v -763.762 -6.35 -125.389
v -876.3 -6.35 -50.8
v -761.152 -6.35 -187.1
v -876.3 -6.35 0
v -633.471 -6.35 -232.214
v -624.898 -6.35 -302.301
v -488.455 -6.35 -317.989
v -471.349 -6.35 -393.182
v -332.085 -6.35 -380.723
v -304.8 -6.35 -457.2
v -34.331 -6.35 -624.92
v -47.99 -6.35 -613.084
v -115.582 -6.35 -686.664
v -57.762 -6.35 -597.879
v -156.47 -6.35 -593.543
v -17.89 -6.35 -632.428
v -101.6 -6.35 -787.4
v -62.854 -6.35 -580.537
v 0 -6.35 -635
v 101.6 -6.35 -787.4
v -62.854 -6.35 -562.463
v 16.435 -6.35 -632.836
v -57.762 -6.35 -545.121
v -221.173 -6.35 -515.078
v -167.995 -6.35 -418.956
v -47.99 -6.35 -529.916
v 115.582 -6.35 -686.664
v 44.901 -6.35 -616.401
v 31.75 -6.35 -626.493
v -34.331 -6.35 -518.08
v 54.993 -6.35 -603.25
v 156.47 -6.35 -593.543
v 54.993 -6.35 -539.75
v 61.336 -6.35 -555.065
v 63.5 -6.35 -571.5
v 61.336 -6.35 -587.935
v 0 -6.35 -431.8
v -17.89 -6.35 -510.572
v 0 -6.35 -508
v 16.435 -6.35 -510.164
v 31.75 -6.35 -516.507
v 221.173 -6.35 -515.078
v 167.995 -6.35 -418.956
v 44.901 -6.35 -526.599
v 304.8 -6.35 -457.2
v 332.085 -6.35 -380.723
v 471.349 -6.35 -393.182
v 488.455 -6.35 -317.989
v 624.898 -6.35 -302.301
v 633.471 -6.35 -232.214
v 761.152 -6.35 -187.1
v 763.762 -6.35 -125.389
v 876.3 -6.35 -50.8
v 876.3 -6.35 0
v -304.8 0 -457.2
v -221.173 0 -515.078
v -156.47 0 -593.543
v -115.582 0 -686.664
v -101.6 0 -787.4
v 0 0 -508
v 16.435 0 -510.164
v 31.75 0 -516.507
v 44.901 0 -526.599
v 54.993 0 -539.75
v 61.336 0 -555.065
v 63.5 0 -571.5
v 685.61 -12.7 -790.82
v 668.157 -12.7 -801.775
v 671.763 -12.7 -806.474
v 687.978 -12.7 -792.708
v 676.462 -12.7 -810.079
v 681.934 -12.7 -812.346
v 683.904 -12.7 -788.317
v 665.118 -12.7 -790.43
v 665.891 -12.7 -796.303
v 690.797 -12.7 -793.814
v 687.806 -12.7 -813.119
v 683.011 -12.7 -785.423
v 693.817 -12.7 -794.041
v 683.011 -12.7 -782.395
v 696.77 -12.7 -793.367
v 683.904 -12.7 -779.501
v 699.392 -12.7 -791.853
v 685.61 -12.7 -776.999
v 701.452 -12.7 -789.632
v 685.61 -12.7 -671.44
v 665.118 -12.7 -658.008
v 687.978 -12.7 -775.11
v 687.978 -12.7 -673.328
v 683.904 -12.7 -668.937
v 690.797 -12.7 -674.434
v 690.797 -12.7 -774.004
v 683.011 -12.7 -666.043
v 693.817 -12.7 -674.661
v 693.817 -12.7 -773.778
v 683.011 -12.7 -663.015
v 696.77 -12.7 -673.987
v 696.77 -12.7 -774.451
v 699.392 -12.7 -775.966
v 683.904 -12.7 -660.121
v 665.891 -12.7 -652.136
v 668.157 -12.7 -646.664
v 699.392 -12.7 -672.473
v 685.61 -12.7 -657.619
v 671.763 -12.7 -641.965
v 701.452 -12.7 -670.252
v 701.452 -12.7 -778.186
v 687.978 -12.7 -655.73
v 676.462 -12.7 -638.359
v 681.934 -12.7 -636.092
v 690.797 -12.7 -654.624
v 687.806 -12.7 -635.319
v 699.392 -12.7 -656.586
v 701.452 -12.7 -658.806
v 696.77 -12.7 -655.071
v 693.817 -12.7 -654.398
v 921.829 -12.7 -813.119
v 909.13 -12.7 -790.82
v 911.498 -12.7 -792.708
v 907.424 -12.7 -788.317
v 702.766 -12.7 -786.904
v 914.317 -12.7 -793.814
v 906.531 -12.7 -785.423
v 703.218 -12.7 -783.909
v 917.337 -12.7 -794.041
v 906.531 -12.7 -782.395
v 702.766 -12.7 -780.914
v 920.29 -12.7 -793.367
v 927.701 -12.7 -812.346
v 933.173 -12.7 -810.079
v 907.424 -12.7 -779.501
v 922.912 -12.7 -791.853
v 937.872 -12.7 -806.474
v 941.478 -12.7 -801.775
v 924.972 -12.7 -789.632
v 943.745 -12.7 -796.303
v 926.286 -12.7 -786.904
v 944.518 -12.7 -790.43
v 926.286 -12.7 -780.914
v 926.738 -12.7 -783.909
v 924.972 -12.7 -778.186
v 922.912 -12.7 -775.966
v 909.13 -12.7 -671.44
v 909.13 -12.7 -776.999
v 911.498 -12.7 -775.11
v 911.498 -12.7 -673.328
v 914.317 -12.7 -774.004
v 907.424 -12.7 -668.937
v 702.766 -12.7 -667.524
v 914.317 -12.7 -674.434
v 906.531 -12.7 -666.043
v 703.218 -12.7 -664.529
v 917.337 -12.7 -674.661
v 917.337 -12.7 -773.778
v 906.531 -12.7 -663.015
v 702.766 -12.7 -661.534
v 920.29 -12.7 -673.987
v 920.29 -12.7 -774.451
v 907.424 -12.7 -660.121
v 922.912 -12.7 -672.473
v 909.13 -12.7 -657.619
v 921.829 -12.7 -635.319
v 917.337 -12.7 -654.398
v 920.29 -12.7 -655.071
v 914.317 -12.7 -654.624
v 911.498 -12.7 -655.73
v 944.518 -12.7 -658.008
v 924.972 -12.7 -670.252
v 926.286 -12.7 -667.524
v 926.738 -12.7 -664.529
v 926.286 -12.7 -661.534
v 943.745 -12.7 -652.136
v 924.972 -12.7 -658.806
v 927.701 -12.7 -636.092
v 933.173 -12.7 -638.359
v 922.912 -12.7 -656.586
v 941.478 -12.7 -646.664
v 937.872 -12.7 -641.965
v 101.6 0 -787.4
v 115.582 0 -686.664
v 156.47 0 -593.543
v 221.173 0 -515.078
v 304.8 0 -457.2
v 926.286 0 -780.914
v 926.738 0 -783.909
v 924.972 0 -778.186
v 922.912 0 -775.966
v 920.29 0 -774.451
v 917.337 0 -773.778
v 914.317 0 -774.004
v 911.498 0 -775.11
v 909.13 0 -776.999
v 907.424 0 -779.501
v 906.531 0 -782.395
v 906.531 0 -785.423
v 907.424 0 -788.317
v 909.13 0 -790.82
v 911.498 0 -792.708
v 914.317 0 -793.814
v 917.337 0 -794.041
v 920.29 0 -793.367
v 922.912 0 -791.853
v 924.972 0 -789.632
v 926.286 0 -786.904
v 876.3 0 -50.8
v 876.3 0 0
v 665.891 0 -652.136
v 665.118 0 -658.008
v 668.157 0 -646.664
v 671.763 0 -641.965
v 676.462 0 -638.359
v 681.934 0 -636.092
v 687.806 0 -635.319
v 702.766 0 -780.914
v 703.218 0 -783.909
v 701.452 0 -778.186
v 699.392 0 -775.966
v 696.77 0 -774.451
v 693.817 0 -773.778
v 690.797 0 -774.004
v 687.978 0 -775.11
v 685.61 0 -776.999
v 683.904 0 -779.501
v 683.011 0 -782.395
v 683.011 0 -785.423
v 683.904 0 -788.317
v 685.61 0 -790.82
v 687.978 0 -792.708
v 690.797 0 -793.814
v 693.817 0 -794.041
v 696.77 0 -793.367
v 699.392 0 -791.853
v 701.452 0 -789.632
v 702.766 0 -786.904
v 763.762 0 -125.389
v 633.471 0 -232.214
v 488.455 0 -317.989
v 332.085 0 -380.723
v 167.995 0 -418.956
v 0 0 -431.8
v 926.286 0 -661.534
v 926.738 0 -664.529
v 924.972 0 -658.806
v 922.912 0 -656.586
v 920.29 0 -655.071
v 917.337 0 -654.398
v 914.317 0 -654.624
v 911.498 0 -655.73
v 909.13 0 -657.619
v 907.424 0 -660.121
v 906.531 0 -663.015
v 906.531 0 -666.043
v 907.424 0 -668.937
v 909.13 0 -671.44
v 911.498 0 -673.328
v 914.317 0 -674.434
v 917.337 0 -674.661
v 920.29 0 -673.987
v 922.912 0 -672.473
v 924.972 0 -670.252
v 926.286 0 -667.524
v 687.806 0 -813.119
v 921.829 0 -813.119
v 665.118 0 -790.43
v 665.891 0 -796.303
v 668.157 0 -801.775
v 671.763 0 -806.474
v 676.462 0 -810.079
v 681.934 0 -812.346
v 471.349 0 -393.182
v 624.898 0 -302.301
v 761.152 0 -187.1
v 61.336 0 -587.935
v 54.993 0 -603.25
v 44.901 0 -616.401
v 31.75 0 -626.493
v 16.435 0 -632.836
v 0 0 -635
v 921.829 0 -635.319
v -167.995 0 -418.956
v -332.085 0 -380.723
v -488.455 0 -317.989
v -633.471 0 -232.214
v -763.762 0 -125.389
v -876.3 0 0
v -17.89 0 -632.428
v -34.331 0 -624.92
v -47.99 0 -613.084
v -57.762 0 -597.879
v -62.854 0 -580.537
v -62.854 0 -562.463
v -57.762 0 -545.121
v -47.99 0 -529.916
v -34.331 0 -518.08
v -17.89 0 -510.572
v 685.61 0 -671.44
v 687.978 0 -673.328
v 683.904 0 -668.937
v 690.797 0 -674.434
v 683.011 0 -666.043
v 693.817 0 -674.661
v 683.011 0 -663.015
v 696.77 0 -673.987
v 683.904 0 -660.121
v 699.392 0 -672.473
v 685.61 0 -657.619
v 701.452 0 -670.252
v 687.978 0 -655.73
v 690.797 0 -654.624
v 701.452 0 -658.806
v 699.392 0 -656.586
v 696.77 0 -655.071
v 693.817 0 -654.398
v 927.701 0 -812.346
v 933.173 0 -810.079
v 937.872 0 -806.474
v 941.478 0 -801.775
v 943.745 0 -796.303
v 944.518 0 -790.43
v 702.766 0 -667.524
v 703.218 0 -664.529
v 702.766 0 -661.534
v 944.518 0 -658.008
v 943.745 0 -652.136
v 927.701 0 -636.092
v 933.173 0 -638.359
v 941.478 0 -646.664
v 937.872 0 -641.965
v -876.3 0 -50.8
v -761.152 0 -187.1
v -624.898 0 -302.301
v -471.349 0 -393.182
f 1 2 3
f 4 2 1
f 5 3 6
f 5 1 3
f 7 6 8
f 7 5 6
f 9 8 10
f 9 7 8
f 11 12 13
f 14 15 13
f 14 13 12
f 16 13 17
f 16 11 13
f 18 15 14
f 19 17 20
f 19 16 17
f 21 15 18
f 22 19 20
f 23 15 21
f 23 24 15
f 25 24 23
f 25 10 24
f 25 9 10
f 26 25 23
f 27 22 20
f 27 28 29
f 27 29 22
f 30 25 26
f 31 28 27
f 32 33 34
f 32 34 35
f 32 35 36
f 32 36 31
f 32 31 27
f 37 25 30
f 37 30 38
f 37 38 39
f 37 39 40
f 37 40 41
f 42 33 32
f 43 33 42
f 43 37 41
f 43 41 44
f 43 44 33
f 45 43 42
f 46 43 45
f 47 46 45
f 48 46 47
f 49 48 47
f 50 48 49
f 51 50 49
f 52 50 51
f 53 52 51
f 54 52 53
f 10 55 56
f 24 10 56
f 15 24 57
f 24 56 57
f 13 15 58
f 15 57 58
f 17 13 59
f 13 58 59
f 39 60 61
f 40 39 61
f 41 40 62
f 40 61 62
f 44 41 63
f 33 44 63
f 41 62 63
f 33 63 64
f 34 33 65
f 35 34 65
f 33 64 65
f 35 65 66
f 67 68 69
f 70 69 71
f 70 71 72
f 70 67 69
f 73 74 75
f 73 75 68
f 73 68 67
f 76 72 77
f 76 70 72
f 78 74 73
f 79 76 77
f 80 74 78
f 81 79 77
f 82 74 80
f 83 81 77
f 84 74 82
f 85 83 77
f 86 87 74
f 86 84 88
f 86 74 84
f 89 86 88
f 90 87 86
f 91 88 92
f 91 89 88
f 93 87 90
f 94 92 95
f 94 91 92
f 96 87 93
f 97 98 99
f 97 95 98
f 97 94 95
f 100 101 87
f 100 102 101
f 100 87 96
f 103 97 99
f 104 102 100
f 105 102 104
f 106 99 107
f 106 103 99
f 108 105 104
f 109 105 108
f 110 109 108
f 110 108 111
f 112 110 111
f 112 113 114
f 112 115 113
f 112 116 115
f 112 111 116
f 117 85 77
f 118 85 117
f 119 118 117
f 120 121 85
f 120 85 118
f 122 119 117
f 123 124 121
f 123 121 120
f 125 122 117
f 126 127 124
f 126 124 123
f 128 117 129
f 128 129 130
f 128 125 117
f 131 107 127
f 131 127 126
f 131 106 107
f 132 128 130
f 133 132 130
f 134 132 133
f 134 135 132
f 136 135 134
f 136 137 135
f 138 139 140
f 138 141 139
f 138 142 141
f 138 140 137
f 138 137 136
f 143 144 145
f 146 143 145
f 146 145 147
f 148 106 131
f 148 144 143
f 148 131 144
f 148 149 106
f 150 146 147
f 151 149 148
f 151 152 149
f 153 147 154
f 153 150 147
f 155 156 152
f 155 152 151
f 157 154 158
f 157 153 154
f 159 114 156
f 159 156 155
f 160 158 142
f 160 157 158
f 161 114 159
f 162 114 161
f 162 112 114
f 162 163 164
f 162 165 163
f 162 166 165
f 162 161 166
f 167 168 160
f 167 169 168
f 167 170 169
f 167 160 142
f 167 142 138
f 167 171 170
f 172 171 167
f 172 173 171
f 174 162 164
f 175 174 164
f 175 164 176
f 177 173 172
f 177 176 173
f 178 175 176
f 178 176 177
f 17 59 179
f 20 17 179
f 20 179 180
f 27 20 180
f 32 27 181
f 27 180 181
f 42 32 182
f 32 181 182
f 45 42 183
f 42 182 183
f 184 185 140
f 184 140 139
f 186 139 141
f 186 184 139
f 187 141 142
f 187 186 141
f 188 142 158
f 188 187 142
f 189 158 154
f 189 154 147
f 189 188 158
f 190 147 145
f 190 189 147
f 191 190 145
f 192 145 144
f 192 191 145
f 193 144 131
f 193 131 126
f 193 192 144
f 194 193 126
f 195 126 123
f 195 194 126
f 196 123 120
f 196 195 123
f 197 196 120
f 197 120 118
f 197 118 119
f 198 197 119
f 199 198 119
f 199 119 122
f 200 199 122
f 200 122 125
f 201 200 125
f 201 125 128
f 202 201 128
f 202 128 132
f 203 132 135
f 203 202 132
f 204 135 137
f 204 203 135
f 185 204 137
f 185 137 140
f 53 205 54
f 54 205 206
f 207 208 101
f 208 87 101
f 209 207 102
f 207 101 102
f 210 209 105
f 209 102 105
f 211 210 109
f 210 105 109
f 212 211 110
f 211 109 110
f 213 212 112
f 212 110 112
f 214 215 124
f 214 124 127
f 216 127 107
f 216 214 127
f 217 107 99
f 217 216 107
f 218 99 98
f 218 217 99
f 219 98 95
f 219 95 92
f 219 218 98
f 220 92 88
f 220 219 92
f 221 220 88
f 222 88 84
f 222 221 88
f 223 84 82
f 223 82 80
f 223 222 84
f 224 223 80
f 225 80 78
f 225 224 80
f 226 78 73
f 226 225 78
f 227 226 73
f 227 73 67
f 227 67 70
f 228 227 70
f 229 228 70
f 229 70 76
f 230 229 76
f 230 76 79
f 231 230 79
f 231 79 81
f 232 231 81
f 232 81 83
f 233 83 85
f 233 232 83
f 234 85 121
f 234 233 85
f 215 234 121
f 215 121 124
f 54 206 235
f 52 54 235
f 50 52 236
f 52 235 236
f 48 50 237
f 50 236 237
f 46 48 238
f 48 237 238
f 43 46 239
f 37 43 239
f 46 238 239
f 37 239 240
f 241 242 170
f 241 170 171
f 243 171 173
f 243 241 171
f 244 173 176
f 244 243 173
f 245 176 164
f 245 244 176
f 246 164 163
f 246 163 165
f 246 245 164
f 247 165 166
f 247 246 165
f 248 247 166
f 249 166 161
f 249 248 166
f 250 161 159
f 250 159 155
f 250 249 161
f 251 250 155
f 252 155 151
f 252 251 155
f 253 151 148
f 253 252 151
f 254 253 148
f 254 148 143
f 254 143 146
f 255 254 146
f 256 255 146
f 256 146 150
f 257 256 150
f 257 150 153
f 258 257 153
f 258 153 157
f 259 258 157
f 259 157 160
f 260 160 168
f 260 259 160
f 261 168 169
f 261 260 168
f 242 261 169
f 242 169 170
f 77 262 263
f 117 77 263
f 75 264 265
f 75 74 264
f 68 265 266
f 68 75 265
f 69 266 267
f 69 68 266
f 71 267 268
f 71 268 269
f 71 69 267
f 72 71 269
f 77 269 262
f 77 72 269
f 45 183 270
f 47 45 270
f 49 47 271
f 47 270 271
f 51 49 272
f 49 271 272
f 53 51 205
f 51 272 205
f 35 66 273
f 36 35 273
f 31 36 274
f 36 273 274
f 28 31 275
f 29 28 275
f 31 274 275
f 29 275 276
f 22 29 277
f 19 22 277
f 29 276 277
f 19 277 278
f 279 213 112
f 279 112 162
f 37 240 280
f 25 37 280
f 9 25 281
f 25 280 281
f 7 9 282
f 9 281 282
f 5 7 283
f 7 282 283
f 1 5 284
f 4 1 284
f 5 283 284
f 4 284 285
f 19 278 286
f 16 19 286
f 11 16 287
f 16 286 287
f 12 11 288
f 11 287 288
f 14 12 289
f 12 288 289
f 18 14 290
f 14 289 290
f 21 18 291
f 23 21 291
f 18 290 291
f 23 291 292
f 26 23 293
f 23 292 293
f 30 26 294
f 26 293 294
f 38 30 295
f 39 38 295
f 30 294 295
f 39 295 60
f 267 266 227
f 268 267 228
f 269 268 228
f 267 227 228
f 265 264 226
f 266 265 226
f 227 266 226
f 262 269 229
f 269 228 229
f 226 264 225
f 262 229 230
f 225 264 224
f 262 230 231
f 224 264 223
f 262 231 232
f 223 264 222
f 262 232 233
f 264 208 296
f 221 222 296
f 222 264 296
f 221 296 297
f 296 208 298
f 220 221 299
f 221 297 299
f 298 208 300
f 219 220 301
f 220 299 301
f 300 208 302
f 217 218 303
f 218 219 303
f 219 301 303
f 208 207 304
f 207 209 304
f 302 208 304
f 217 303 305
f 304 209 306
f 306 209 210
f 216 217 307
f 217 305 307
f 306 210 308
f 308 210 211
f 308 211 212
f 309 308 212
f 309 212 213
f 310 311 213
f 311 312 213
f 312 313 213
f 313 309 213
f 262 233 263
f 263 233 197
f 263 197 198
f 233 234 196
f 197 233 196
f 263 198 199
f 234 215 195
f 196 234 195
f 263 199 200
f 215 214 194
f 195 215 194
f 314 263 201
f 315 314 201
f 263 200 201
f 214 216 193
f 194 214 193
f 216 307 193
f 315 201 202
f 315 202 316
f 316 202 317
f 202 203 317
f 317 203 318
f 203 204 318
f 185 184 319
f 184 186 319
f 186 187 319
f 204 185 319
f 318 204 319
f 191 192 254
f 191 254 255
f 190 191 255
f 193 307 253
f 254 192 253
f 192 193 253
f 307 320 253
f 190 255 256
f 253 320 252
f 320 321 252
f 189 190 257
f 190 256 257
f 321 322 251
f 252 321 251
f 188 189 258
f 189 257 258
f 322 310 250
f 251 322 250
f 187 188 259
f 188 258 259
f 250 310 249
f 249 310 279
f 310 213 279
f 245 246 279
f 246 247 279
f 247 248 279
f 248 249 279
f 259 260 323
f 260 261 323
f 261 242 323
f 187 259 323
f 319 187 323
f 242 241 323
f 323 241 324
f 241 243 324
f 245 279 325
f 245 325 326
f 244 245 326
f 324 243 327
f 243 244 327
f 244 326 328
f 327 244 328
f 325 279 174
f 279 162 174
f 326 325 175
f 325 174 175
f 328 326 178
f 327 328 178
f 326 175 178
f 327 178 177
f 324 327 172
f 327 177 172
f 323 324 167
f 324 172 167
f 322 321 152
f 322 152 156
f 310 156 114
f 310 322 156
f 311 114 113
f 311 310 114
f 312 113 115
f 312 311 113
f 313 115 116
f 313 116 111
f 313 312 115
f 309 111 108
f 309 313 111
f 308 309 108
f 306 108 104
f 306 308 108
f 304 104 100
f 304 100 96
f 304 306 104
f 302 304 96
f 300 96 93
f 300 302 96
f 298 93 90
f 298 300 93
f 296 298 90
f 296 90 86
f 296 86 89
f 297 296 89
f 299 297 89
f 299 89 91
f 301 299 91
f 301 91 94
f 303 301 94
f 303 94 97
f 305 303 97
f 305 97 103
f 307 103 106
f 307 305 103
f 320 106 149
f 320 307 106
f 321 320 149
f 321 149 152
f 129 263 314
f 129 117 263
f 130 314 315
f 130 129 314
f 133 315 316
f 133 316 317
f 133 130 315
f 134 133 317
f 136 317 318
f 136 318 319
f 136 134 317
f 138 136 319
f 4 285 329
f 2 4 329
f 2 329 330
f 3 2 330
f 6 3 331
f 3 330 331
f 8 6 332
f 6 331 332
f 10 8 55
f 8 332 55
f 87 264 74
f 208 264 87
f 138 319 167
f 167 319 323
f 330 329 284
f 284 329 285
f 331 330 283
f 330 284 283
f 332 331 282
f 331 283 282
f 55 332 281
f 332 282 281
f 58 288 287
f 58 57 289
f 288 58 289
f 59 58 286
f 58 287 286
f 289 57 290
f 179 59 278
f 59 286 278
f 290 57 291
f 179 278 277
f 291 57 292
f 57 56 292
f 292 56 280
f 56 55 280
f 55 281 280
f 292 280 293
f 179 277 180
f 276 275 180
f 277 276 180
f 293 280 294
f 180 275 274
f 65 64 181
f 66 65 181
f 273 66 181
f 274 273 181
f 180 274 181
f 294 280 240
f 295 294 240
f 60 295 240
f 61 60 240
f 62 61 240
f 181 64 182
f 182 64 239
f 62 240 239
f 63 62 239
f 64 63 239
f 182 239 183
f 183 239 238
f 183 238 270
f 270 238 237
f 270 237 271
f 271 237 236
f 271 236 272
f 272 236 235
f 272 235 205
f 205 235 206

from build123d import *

# Parameters (mm, degrees)
F0_W     = 101.6
F0_H     = 25.4
F1_DEPTH = 6.35
F2_W     = 279.4
F2_H     = 177.8
F2_R     = 10.16
F3_DEPTH = 12.7
F4_R     = 22.688779


with BuildPart() as f1:
    # F0 (on Front) → F1 (new body)
    with BuildSketch(Plane.XZ):
        with BuildLine():
            ThreePointArc((0, -431.8), (-488.454944, -317.989446), (-876.3, 0))
            Line((-876.3, 0), (-876.3, -50.8))
            ThreePointArc((-876.3, -50.8), (-624.897732, -302.301498), (-304.8, -457.2))
            Line((-304.8, -457.2), (-101.6, -457.2))
            Line((-101.6, -457.2), (-101.6, -431.8))
            Line((-101.6, -431.8), (0, -431.8))
        make_face()
        with BuildLine():
            Line((-101.6, -457.2), (-304.8, -457.2))
            ThreePointArc((-304.8, -457.2), (-156.469734, -593.542913), (-101.6, -787.4))
            Line((-101.6, -787.4), (-101.6, -457.2))
        make_face()
        with BuildLine():
            Line((0, -508), (0, -457.2))
            Line((0, -457.2), (-101.6, -457.2))
            Line((-101.6, -457.2), (-101.6, -787.4))
            Line((-101.6, -787.4), (0, -787.4))
            Line((0, -787.4), (0, -635))
            ThreePointArc((0, -635), (-63.5, -571.5), (0, -508))
        make_face()
        with BuildLine():
            Line((101.6, -457.2), (0, -457.2))
            Line((0, -457.2), (0, -508))
            ThreePointArc((0, -508), (44.901281, -526.598719), (63.5, -571.5))
            ThreePointArc((63.5, -571.5), (44.901281, -616.401281), (0, -635))
            Line((0, -635), (0, -787.4))
            Line((0, -787.4), (101.6, -787.4))
            Line((101.6, -787.4), (101.6, -457.2))
        make_face()
        with Locations((-50.8, -444.5)):
            Rectangle(F0_W, F0_H)
        with Locations((50.8, -444.5)):
            Rectangle(F0_W, F0_H)
        with BuildLine():
            Line((876.3, -50.8), (876.3, 0))
            ThreePointArc((876.3, 0), (488.454944, -317.989446), (0, -431.8))
            Line((0, -431.8), (101.6, -431.8))
            Line((101.6, -431.8), (101.6, -457.2))
            Line((101.6, -457.2), (304.8, -457.2))
            ThreePointArc((304.8, -457.2), (624.897732, -302.301498), (876.3, -50.8))
        make_face()
        with BuildLine():
            ThreePointArc((101.6, -787.4), (156.469734, -593.542913), (304.8, -457.2))
            Line((304.8, -457.2), (101.6, -457.2))
            Line((101.6, -457.2), (101.6, -787.4))
        make_face()
    extrude(amount=F1_DEPTH)


with BuildPart() as f3:
    # F2 (on Front) → F3 (new body)
    with BuildSketch(Plane.XZ):
        with Locations((804.81764, -724.219126)):
            Rectangle(F2_W, F2_H)
        with Locations((693.05764, -783.909126)):
            Circle(F2_R, mode=Mode.SUBTRACT)
        with Locations((916.57764, -783.909126)):
            Circle(F2_R, mode=Mode.SUBTRACT)
        with Locations((693.05764, -664.529126)):
            Circle(F2_R, mode=Mode.SUBTRACT)
        with Locations((916.57764, -664.529126)):
            Circle(F2_R, mode=Mode.SUBTRACT)
    extrude(amount=F3_DEPTH)

    # F4
    f4_edges = [f3.edges().sort_by_distance(p)[0] for p in [
        (665.11764, -6.35, -635.319126),
        (665.11764, -6.35, -813.119126),
        (944.51764, -6.35, -635.319126),
        (944.51764, -6.35, -813.119126),
    ]]
    fillet(f4_edges, radius=F4_R)


solid = Compound([f1.part, f3.part])
